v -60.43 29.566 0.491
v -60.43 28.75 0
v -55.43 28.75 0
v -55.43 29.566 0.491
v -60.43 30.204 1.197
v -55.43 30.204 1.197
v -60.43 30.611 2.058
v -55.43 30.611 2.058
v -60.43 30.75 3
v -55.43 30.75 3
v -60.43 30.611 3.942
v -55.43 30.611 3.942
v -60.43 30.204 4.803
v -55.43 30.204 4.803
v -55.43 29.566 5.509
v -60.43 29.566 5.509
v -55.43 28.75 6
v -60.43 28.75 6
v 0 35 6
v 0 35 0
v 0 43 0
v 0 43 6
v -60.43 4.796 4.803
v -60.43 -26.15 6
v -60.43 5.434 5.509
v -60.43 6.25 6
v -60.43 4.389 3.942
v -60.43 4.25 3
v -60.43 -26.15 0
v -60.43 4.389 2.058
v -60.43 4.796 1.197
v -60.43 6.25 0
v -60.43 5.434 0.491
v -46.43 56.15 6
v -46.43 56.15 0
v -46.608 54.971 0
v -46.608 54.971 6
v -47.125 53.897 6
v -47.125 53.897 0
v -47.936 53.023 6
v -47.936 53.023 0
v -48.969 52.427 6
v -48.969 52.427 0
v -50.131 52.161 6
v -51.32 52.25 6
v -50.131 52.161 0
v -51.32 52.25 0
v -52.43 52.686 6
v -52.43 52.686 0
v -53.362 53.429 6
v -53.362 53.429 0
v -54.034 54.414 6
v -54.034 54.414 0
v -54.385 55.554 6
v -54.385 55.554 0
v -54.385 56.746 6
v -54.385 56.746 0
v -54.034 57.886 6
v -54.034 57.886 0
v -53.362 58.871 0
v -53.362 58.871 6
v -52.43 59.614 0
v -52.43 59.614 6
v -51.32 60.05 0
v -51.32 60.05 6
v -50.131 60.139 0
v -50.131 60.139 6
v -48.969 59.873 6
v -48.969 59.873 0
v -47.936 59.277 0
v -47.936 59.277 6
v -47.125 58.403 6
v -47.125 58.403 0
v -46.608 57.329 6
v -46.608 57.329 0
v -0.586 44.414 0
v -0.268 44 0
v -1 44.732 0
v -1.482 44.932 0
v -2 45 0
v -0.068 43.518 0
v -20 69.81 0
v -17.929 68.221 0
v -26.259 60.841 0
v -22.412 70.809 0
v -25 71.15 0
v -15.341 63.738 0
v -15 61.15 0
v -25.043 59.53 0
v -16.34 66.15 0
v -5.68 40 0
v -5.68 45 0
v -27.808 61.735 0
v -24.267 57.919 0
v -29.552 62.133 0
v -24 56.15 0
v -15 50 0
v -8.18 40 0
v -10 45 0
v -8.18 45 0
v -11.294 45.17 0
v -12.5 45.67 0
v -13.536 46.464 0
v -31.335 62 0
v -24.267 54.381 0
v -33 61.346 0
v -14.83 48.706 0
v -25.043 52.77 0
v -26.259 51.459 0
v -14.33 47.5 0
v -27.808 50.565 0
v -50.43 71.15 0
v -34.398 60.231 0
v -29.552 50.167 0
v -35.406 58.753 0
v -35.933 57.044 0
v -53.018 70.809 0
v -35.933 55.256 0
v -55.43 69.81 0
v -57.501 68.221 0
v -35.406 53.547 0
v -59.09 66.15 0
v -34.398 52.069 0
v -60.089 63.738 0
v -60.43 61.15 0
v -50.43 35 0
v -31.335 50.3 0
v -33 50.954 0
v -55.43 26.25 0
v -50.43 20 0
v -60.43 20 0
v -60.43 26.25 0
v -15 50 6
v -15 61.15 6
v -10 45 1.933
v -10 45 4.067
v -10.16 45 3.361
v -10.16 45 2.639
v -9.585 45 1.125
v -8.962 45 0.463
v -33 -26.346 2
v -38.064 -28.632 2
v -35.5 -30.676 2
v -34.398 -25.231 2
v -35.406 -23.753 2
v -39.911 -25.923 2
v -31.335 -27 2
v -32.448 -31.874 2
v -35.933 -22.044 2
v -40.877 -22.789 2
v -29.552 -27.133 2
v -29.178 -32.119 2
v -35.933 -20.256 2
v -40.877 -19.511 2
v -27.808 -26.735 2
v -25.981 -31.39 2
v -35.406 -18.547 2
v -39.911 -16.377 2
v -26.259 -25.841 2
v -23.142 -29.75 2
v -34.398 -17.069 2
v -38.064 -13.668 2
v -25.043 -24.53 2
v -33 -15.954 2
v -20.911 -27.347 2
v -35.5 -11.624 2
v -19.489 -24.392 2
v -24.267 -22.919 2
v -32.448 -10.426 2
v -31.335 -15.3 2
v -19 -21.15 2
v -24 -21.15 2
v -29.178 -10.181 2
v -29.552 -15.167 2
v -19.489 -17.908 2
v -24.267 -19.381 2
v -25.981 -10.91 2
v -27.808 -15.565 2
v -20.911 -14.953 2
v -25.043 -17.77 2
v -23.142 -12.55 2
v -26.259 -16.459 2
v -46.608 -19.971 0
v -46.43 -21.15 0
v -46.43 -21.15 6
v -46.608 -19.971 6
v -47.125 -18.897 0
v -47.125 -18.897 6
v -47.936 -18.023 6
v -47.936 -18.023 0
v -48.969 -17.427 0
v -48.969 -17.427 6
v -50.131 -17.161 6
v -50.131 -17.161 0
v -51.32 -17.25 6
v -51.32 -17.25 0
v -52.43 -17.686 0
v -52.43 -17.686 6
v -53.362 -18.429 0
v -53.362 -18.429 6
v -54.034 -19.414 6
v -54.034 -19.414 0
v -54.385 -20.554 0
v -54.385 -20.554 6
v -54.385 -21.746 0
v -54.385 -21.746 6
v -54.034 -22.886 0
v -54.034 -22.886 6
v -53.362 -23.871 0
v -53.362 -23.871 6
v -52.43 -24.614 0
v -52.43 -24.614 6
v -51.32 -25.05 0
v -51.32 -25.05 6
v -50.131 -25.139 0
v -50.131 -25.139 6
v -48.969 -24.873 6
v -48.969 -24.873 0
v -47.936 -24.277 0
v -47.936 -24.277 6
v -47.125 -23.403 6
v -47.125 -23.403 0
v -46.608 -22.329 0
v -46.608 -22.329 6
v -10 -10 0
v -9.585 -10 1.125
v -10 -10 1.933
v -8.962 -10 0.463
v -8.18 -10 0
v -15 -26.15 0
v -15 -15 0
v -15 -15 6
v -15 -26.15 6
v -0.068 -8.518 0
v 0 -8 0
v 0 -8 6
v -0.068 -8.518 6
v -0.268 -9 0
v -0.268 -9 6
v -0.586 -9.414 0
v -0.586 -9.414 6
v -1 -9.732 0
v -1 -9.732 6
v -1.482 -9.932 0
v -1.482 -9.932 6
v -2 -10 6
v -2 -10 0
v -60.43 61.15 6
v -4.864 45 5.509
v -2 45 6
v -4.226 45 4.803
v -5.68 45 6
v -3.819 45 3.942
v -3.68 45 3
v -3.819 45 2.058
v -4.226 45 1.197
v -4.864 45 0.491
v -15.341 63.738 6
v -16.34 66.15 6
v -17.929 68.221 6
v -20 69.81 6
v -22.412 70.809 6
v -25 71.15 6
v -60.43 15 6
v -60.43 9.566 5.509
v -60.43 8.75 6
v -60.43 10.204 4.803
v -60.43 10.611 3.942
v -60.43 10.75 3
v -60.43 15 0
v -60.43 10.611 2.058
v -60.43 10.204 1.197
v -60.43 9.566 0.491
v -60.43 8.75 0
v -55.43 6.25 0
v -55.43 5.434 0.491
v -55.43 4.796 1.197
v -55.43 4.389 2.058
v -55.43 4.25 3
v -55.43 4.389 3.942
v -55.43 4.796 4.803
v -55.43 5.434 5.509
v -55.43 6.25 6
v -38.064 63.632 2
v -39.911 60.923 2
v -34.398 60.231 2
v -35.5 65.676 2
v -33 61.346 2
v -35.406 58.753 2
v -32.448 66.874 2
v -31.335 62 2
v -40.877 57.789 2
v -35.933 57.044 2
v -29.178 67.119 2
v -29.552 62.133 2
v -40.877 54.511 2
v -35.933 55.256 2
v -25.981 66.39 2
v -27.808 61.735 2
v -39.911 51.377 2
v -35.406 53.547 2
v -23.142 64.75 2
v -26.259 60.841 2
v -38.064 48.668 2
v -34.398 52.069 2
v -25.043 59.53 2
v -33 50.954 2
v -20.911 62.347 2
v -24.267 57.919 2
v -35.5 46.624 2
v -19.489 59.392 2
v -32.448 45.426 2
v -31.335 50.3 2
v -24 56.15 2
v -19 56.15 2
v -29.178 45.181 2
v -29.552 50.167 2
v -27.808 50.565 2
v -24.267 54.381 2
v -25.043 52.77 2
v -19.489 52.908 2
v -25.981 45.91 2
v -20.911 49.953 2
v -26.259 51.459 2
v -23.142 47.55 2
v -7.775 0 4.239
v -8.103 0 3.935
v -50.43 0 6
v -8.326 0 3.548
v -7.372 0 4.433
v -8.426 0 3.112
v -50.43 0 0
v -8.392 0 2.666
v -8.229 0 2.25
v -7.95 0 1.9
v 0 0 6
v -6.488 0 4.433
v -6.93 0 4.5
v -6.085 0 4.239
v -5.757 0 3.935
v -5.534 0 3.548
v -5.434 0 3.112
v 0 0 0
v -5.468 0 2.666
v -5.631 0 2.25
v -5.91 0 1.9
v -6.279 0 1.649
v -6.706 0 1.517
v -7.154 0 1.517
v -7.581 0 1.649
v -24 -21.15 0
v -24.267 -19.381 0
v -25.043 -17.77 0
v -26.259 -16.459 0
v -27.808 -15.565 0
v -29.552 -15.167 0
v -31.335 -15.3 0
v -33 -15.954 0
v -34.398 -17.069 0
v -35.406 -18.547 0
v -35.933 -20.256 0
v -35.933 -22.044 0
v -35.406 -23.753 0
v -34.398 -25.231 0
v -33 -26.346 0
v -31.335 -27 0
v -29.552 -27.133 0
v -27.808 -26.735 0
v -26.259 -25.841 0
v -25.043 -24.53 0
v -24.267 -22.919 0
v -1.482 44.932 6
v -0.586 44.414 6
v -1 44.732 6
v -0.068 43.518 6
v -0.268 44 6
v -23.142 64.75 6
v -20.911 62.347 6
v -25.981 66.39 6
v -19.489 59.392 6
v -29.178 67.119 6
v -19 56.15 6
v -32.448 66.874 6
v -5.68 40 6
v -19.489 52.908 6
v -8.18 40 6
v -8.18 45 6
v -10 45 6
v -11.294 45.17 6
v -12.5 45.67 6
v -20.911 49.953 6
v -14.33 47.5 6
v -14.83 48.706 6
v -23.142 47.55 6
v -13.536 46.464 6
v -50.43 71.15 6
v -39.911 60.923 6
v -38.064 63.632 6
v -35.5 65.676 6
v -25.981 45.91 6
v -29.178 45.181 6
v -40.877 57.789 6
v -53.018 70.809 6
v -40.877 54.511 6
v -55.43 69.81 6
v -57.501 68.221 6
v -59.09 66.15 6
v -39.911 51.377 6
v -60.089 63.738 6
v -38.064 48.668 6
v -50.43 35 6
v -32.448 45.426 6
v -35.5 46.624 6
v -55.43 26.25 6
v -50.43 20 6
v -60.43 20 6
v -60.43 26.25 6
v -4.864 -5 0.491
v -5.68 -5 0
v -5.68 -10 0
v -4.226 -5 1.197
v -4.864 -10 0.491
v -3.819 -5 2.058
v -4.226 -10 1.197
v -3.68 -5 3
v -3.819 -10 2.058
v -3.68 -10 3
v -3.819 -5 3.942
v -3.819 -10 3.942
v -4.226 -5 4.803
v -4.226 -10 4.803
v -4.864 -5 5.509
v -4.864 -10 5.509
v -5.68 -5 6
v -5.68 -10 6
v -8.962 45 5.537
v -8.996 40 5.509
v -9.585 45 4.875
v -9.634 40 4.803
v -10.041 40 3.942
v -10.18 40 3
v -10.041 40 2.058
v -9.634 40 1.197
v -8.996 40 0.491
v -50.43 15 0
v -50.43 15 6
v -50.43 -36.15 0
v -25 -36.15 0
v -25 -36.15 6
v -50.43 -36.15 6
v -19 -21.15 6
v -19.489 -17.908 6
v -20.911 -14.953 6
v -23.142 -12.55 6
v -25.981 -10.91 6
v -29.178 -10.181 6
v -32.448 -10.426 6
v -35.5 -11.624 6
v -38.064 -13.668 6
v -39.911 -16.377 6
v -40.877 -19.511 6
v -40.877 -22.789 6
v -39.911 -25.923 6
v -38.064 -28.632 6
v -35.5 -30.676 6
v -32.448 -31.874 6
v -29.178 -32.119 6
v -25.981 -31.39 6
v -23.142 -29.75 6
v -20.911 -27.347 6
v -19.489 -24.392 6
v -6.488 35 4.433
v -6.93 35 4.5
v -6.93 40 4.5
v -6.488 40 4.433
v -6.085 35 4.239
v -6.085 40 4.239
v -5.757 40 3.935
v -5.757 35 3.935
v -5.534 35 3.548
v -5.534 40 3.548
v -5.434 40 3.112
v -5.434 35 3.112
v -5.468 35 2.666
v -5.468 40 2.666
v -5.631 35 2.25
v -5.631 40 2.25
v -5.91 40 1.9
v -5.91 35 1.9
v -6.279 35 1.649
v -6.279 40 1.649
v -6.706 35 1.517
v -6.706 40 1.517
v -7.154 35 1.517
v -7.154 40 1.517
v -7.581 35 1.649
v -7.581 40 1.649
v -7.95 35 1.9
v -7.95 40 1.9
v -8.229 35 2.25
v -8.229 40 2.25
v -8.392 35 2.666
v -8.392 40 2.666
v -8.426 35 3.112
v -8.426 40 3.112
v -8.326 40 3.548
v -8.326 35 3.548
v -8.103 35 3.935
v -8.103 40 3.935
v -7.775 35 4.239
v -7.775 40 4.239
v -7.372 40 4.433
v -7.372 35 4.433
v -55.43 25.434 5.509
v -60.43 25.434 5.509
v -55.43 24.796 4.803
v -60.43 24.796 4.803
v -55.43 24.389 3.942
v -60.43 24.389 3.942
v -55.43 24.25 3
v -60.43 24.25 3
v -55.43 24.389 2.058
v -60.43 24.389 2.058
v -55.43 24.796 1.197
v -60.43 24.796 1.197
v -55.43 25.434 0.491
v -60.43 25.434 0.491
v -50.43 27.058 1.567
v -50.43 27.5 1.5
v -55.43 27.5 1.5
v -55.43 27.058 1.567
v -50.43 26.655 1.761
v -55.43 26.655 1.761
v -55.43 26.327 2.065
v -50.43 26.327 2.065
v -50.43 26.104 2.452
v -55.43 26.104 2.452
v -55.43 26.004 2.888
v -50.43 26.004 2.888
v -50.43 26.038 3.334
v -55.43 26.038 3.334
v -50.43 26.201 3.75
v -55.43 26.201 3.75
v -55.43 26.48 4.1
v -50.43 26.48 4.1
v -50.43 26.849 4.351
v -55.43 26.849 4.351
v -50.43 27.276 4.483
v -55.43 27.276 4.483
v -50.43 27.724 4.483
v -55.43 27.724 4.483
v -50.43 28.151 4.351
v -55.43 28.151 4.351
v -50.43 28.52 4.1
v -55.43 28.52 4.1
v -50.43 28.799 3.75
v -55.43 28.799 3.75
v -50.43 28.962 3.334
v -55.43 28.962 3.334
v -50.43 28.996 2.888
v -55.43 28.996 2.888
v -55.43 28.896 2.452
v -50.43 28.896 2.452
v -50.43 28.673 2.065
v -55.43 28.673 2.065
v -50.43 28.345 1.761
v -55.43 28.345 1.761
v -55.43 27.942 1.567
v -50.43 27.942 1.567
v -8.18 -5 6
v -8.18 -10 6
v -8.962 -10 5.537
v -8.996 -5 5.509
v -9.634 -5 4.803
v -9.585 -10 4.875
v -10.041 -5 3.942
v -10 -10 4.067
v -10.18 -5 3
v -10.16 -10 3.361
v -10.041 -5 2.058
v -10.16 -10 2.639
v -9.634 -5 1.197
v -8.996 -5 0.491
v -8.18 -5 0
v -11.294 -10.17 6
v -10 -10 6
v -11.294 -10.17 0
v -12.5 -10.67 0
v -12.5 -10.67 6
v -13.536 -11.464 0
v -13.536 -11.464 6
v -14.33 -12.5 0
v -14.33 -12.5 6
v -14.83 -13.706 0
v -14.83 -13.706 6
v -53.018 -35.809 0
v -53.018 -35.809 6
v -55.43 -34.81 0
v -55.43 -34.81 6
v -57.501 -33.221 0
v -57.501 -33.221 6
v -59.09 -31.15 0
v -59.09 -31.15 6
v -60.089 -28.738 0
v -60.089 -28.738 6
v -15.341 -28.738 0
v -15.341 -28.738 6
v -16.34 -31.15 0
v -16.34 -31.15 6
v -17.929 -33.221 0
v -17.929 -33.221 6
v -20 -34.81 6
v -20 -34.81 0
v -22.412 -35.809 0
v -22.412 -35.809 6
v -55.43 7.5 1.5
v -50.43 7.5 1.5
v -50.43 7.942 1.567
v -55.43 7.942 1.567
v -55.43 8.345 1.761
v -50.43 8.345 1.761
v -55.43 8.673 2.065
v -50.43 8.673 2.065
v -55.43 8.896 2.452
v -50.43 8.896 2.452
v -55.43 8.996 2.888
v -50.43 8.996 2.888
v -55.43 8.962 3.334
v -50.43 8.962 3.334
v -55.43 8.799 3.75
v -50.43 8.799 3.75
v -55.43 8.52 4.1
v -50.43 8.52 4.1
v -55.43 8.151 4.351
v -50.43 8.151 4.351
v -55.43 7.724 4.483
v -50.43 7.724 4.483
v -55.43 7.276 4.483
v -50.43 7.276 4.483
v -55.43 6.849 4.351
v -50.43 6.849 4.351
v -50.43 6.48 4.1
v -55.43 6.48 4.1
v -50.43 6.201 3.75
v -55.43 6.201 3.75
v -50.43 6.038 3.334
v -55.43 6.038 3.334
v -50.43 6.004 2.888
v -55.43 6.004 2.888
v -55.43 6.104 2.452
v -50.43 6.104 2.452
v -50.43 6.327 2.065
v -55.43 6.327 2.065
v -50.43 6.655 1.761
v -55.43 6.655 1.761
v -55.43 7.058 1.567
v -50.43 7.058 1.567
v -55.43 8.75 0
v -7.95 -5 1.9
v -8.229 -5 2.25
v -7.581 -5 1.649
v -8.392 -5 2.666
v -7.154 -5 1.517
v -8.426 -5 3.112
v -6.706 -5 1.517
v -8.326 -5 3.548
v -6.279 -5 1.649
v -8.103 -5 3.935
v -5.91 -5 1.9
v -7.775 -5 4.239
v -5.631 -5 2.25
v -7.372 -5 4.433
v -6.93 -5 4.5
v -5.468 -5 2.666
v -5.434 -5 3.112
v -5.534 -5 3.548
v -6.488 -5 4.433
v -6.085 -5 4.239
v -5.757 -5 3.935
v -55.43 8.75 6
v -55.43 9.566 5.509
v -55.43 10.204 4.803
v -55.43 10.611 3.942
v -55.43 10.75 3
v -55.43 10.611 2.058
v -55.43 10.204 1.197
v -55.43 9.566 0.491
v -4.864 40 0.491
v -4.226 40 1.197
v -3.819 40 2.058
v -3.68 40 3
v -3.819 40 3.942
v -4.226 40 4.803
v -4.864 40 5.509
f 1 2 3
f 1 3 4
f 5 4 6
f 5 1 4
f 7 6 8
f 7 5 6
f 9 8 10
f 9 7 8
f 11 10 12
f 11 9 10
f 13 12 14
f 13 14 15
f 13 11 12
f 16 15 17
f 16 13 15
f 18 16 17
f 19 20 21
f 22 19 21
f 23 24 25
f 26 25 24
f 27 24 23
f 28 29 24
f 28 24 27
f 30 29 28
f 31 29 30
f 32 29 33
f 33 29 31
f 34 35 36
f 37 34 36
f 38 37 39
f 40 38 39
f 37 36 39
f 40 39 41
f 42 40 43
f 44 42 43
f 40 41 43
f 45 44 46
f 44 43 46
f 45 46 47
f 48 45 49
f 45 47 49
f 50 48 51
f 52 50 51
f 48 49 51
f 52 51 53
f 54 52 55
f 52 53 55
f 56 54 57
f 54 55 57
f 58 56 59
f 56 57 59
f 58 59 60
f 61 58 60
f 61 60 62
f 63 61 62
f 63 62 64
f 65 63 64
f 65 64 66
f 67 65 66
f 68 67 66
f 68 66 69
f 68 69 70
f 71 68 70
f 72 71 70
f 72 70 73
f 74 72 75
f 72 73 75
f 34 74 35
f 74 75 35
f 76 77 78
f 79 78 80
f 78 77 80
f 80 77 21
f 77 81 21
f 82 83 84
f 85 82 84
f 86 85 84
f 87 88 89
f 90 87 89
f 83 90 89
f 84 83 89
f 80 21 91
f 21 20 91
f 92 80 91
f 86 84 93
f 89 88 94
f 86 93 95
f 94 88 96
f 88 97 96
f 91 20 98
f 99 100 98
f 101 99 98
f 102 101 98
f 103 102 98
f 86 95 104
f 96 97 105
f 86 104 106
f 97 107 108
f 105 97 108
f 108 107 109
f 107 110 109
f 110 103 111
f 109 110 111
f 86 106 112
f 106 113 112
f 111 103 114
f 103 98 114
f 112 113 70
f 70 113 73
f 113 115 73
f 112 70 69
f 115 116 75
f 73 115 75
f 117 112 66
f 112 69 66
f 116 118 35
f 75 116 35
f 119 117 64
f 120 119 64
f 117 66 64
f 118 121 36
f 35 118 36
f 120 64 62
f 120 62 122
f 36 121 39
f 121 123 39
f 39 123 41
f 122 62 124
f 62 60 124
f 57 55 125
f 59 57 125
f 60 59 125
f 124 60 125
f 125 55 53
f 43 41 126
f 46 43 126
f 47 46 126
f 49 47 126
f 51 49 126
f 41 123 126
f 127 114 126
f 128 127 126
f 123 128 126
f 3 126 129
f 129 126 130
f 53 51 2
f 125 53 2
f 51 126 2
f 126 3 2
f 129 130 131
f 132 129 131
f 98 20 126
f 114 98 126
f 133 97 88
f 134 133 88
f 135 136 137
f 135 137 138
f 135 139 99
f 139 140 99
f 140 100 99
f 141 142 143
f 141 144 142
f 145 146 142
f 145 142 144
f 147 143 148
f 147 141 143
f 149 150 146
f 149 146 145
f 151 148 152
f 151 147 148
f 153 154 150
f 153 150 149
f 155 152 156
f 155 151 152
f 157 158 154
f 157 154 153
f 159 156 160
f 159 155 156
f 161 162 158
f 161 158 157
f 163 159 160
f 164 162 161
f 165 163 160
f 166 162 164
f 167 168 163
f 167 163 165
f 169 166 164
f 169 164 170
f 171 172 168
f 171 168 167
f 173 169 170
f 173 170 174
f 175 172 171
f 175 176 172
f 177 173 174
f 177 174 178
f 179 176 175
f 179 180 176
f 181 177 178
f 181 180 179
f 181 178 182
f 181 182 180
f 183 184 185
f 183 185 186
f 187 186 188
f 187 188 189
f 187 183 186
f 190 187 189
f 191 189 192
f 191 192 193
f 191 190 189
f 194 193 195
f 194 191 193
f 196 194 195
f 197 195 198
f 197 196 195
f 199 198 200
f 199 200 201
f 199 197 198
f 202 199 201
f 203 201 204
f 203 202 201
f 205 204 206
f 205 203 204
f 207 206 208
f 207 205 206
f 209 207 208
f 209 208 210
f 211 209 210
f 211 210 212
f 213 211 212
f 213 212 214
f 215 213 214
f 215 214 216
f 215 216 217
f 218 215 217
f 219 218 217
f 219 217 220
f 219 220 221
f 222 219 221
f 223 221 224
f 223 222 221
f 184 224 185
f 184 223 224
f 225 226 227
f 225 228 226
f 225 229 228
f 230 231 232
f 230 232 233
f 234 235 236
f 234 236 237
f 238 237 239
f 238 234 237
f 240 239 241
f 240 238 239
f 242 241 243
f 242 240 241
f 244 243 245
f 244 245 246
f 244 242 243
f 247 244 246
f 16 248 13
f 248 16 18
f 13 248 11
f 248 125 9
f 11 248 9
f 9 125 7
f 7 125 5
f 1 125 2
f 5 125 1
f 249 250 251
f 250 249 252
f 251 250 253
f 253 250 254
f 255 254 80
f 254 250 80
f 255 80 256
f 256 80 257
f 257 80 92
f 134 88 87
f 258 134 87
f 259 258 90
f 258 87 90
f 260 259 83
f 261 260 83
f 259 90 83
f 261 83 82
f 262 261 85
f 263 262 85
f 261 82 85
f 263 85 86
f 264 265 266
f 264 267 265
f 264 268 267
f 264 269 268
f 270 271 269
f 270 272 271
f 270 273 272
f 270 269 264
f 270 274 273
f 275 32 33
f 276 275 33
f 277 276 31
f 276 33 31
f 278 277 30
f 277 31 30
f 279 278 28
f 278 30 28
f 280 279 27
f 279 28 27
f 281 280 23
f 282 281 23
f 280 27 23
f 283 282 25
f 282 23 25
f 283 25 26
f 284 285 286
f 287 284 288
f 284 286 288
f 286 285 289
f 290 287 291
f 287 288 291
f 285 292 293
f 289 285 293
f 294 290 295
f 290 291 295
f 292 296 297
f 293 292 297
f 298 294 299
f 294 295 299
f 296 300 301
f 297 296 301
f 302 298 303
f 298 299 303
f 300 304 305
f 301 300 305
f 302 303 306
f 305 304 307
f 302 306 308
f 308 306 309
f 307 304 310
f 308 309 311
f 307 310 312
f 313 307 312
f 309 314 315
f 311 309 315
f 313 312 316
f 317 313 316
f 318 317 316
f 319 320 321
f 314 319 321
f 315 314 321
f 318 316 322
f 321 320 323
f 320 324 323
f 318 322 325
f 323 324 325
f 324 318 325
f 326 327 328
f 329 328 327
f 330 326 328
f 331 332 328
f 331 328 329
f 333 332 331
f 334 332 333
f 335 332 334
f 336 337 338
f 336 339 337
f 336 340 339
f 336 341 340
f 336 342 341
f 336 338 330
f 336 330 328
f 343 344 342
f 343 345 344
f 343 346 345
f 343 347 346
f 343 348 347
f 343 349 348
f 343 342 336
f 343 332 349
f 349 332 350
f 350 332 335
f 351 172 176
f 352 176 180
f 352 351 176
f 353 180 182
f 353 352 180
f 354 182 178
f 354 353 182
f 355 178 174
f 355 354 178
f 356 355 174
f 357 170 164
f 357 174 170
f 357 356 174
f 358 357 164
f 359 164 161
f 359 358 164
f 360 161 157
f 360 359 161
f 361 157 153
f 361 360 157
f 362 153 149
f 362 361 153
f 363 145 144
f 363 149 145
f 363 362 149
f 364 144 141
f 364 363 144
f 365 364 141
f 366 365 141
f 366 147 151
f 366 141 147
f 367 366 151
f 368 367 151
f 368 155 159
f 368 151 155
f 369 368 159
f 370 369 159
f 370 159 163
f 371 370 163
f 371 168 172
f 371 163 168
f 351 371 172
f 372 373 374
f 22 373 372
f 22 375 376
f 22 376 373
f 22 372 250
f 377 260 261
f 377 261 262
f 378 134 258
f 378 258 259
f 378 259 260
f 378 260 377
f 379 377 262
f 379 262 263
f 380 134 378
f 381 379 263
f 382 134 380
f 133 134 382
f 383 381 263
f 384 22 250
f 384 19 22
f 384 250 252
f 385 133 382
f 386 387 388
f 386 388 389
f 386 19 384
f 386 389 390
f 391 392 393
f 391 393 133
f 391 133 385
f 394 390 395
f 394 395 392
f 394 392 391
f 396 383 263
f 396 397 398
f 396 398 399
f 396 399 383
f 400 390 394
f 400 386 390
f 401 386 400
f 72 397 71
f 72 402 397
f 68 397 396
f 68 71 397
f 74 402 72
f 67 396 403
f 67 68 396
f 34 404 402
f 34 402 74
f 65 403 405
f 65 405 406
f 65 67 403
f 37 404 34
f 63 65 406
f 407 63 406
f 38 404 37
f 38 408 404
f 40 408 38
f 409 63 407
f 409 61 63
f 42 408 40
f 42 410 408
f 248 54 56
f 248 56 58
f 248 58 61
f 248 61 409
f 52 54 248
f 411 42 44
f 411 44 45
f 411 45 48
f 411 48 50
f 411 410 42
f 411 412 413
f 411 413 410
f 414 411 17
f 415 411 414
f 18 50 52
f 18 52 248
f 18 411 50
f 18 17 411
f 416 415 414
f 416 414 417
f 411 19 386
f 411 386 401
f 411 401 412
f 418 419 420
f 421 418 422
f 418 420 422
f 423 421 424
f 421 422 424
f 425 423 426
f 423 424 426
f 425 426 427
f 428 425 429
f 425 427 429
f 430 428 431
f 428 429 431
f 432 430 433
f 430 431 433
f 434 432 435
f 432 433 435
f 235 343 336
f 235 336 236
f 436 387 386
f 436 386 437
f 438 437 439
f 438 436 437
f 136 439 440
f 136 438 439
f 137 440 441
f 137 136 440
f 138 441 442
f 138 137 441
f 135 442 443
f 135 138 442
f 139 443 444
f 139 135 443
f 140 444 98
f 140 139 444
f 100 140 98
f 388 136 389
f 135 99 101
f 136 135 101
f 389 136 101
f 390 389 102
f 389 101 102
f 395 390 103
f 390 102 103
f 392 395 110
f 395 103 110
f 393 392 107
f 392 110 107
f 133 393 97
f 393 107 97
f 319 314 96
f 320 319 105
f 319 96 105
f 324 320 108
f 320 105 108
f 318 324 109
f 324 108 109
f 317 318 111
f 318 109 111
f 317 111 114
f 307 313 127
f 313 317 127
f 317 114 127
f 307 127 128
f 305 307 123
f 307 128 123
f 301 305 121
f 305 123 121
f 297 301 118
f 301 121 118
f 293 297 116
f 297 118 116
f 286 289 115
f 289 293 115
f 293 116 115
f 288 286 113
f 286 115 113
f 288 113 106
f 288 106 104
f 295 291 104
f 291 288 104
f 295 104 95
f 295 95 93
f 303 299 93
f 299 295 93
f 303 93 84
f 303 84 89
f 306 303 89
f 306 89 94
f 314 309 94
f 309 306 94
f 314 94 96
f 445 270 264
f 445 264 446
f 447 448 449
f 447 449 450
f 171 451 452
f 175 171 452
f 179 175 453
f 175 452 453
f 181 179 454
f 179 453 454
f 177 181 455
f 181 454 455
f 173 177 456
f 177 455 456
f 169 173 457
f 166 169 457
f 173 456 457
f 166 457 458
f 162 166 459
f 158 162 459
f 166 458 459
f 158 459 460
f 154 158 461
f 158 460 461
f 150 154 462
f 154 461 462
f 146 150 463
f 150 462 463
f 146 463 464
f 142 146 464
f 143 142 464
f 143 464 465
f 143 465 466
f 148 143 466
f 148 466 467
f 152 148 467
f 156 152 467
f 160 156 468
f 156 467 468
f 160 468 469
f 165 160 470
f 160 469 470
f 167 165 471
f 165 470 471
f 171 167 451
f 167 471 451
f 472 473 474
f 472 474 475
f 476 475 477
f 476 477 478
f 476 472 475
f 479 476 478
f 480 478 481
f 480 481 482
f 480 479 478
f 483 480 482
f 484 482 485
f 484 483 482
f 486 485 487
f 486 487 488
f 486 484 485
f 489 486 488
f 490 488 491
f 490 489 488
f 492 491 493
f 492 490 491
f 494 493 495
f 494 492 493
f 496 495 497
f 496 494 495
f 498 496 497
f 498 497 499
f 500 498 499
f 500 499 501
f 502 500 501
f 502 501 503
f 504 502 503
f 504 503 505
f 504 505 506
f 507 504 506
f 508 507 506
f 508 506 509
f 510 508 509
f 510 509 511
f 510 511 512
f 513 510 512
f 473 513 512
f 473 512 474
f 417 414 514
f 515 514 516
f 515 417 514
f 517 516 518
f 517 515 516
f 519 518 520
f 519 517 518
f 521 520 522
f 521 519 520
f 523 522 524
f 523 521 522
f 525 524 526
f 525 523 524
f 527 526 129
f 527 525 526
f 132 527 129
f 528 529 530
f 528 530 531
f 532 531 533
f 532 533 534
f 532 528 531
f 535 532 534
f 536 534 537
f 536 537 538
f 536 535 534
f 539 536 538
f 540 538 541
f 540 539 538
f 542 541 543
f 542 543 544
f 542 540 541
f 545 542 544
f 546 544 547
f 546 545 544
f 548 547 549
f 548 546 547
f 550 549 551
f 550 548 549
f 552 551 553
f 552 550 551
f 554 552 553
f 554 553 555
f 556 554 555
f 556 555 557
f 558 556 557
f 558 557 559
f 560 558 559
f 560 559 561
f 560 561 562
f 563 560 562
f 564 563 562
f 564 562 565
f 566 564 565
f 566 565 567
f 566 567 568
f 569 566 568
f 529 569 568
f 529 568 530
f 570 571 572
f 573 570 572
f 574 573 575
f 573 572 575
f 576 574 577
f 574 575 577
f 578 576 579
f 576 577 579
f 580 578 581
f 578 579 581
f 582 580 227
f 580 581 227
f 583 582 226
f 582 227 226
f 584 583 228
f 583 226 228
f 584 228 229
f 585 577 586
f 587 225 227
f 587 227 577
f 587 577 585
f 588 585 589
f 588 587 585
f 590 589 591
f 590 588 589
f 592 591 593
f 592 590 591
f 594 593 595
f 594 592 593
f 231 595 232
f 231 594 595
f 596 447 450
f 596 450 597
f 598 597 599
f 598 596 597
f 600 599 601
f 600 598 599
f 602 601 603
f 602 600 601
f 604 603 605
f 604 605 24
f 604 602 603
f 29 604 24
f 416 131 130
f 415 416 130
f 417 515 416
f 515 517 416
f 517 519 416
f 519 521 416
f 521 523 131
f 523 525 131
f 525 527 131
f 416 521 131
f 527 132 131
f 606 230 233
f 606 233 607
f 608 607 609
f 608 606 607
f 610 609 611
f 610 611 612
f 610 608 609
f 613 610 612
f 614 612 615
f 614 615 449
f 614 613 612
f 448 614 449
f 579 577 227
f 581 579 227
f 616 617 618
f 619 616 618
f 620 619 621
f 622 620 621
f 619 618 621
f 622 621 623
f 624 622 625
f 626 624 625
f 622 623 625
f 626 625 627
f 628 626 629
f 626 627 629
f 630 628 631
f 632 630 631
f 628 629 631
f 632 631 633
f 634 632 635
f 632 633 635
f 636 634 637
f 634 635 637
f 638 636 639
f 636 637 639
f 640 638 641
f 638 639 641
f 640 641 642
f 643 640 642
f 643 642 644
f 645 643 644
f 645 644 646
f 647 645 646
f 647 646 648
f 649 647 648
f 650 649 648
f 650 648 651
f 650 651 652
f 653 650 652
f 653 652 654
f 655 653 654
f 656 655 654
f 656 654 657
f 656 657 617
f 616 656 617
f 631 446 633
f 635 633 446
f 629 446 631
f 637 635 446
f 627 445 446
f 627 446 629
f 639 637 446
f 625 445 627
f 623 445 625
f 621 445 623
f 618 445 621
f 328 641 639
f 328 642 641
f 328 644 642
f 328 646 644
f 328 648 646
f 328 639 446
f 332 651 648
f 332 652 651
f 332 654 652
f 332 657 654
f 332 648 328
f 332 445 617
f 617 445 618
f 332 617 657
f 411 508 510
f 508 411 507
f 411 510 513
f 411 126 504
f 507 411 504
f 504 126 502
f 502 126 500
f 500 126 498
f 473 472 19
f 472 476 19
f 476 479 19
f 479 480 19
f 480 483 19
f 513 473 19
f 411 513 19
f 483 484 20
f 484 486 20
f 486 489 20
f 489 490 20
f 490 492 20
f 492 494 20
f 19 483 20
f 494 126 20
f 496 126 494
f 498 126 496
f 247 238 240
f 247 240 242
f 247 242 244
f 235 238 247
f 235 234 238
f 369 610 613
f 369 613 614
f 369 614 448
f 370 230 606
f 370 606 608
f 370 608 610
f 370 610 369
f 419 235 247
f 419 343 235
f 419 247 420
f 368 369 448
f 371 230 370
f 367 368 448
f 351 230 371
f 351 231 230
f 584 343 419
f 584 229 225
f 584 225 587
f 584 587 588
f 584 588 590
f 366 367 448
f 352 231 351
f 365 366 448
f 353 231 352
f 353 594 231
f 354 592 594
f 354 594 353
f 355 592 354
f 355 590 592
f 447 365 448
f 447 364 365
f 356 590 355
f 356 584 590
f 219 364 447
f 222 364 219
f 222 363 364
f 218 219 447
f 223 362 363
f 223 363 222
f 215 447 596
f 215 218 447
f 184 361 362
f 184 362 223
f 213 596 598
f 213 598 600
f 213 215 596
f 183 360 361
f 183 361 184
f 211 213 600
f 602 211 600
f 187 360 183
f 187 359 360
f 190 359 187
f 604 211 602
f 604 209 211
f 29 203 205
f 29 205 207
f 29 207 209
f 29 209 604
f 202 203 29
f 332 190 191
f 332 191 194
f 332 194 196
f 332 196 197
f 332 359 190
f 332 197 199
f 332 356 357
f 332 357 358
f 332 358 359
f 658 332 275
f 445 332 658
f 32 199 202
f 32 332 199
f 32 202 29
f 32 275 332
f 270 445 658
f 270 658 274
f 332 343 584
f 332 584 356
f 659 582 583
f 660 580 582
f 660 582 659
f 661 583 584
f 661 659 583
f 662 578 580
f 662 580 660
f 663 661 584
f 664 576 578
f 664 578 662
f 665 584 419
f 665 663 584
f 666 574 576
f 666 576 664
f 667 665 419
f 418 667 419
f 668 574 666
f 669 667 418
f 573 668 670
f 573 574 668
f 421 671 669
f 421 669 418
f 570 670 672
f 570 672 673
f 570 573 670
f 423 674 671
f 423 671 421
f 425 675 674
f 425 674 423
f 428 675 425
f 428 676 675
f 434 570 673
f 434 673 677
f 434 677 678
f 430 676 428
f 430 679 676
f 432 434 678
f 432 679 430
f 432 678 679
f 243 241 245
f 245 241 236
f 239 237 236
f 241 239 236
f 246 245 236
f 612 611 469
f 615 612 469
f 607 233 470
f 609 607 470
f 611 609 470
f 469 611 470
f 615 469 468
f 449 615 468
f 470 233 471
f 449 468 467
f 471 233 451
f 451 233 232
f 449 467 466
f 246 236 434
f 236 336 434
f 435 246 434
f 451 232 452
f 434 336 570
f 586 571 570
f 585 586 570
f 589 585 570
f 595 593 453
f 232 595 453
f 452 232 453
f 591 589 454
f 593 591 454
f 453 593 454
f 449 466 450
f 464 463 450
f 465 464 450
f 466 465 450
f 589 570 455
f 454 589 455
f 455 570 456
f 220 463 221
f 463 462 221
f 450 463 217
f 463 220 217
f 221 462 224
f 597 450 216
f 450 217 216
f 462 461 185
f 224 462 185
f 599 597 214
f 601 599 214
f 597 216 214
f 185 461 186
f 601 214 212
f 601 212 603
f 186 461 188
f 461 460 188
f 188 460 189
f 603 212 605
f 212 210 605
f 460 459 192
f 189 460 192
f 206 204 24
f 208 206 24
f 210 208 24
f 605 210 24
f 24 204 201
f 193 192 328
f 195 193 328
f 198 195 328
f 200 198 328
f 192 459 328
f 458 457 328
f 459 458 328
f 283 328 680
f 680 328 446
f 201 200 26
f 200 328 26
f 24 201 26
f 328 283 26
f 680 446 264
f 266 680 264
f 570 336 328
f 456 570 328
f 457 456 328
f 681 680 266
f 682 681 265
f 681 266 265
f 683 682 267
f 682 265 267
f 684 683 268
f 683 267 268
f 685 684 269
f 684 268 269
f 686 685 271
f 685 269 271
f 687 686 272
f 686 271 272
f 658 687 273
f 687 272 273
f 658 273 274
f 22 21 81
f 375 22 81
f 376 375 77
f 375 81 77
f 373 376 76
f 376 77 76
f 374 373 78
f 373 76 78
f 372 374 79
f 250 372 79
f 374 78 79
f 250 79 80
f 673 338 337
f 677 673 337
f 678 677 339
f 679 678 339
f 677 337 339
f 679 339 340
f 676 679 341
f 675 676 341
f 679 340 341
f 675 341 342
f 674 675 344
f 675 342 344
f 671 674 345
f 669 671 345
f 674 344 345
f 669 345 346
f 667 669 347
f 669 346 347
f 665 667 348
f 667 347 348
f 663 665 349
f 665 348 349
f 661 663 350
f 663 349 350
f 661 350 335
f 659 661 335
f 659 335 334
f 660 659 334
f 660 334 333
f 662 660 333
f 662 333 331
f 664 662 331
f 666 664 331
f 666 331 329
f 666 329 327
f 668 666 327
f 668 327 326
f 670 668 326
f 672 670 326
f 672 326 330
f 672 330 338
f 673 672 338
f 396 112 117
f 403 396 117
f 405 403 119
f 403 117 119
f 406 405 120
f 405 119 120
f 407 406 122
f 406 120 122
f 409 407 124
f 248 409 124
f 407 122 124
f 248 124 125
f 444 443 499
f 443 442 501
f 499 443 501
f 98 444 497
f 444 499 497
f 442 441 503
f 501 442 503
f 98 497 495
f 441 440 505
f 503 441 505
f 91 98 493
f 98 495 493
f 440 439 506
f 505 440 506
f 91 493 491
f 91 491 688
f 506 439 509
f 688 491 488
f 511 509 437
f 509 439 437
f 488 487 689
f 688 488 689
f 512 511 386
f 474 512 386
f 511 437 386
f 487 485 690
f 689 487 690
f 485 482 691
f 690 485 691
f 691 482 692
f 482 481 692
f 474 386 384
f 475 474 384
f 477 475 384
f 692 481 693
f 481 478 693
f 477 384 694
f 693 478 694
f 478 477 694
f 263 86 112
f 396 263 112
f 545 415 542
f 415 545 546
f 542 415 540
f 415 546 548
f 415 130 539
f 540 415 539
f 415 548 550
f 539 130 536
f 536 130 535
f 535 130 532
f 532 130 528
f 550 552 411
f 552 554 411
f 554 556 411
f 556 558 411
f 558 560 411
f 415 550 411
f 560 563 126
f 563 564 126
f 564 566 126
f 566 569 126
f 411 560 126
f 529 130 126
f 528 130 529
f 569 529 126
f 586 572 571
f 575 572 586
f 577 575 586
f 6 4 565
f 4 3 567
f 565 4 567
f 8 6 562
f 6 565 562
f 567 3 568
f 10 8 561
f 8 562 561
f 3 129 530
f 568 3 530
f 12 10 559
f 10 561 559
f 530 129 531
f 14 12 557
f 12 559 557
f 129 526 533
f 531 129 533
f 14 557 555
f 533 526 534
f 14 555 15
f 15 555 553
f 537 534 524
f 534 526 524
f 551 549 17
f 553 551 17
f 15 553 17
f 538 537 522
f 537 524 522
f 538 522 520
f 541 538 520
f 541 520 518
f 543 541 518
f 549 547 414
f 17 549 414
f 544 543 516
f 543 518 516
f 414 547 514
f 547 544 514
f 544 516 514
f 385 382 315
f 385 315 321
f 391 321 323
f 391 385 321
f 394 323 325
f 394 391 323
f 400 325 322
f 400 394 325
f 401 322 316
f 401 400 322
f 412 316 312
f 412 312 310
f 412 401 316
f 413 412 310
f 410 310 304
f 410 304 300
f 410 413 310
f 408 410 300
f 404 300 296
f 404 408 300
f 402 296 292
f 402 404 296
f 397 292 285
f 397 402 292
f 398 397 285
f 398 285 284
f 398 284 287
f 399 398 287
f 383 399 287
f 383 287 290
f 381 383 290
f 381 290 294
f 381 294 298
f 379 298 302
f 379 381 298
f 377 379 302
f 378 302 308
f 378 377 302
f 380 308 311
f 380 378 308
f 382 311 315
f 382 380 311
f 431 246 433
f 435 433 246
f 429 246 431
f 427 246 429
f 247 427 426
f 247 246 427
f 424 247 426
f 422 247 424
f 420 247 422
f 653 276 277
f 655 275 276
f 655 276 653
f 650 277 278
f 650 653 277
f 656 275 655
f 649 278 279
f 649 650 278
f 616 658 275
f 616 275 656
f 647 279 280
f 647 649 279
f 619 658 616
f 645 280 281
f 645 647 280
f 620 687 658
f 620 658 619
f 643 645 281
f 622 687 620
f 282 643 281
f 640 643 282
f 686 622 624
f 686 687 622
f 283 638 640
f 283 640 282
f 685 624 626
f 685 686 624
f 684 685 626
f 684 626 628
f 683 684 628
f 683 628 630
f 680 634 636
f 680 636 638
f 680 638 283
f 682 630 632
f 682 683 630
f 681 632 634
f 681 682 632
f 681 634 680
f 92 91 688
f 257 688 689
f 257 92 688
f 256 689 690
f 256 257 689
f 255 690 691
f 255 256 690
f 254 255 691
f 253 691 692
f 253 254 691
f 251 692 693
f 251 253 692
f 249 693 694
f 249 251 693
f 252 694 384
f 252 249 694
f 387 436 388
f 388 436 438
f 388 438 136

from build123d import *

# Parameters (mm, degrees)
CROQUIS1_R              = 4
CROQUIS1_R_2            = 6
SALIENTE_EXTRUIR2_DEPTH = 6
CROQUIS2_R              = 11
CORTAR_EXTRUIR1_DEPTH   = 4
CROQUIS3_R              = 1.5
CORTAR_EXTRUIR2_DEPTH   = 71.672536391
CROQUIS4_R              = 1.5
CORTAR_EXTRUIR3_DEPTH   = 63.337848856
CROQUIS5_R              = 3.25
CORTAR_EXTRUIR4_DEPTH   = 5
CROQUIS6_R              = 3.25
CORTAR_EXTRUIR5_DEPTH   = 5


with BuildPart() as part:
    # Croquis1 → Saliente-Extruir2 (new body)
    with BuildSketch(Plane.XY):
        with BuildLine():
            Line((-50.43, 0), (0, 0))
            Line((0, 0), (0, -8))
            ThreePointArc((0, -8), (-0.585786438, -9.414213562), (-2, -10))
            Line((-2, -10), (-10, -10))
            ThreePointArc((-10, -10), (-13.535533906, -11.464466094), (-15, -15))
            Line((-15, -15), (-15, -26.15))
            ThreePointArc((-15, -26.15), (-17.928932188, -33.221067812), (-25, -36.15))
            Line((-25, -36.15), (-50.43, -36.15))
            ThreePointArc((-50.43, -36.15), (-57.501067812, -33.221067812), (-60.43, -26.15))
            Line((-60.43, -26.15), (-60.43, 15))
            Line((-60.43, 15), (-50.43, 15))
            Line((-50.43, 15), (-50.43, 0))
        make_face()
        with Locations((-50.43, -21.15)):
            Circle(CROQUIS1_R, mode=Mode.SUBTRACT)
        with Locations((-30, -21.15)):
            Circle(CROQUIS1_R_2, mode=Mode.SUBTRACT)
    extrude(amount=SALIENTE_EXTRUIR2_DEPTH)

    # Croquis2 → Cortar-Extruir1 (cut)
    with BuildSketch(Plane.XY.offset(6)):
        with Locations((-30, -21.15)):
            Circle(CROQUIS2_R)
    extrude(amount=-CORTAR_EXTRUIR1_DEPTH, mode=Mode.SUBTRACT)

    # Croquis3 → Cortar-Extruir2 (cut, through all)
    with BuildSketch(Plane(origin=(0, 0, 0), x_dir=(-1, 0, 0), z_dir=(0, 1, 0))):
        with Locations(Location((6.93, 3, 0), (0, 0, 90))):
            Circle(CROQUIS3_R)
    extrude(amount=-CORTAR_EXTRUIR2_DEPTH, mode=Mode.SUBTRACT)

    # Croquis4 → Cortar-Extruir3 (cut, through all)
    with BuildSketch(Plane(origin=(-50.43, 0, 0), x_dir=(0, 0, -1), z_dir=(1, 0, 0))):
        with Locations((-3, 7.5)):
            Circle(CROQUIS4_R)
    extrude(amount=-CORTAR_EXTRUIR3_DEPTH, mode=Mode.SUBTRACT)

    # Croquis5 → Cortar-Extruir4 (cut)
    with BuildSketch(Plane.ZY.offset(60.43)):
        with Locations((3, 7.5)):
            Circle(CROQUIS5_R)
    extrude(amount=-CORTAR_EXTRUIR4_DEPTH, mode=Mode.SUBTRACT)

    # Croquis6 → Cortar-Extruir5 (cut)
    with BuildSketch(Plane.XZ.offset(10)):
        with Locations((-6.93, 3)):
            Circle(CROQUIS6_R)
    extrude(amount=-CORTAR_EXTRUIR5_DEPTH, mode=Mode.SUBTRACT)


with BuildPart() as body_2:
    # Simetría2: mirrored copy
    add(part.part.mirror(Plane.ZX.offset(17.5)))


solid = Compound([part.part, body_2.part])
